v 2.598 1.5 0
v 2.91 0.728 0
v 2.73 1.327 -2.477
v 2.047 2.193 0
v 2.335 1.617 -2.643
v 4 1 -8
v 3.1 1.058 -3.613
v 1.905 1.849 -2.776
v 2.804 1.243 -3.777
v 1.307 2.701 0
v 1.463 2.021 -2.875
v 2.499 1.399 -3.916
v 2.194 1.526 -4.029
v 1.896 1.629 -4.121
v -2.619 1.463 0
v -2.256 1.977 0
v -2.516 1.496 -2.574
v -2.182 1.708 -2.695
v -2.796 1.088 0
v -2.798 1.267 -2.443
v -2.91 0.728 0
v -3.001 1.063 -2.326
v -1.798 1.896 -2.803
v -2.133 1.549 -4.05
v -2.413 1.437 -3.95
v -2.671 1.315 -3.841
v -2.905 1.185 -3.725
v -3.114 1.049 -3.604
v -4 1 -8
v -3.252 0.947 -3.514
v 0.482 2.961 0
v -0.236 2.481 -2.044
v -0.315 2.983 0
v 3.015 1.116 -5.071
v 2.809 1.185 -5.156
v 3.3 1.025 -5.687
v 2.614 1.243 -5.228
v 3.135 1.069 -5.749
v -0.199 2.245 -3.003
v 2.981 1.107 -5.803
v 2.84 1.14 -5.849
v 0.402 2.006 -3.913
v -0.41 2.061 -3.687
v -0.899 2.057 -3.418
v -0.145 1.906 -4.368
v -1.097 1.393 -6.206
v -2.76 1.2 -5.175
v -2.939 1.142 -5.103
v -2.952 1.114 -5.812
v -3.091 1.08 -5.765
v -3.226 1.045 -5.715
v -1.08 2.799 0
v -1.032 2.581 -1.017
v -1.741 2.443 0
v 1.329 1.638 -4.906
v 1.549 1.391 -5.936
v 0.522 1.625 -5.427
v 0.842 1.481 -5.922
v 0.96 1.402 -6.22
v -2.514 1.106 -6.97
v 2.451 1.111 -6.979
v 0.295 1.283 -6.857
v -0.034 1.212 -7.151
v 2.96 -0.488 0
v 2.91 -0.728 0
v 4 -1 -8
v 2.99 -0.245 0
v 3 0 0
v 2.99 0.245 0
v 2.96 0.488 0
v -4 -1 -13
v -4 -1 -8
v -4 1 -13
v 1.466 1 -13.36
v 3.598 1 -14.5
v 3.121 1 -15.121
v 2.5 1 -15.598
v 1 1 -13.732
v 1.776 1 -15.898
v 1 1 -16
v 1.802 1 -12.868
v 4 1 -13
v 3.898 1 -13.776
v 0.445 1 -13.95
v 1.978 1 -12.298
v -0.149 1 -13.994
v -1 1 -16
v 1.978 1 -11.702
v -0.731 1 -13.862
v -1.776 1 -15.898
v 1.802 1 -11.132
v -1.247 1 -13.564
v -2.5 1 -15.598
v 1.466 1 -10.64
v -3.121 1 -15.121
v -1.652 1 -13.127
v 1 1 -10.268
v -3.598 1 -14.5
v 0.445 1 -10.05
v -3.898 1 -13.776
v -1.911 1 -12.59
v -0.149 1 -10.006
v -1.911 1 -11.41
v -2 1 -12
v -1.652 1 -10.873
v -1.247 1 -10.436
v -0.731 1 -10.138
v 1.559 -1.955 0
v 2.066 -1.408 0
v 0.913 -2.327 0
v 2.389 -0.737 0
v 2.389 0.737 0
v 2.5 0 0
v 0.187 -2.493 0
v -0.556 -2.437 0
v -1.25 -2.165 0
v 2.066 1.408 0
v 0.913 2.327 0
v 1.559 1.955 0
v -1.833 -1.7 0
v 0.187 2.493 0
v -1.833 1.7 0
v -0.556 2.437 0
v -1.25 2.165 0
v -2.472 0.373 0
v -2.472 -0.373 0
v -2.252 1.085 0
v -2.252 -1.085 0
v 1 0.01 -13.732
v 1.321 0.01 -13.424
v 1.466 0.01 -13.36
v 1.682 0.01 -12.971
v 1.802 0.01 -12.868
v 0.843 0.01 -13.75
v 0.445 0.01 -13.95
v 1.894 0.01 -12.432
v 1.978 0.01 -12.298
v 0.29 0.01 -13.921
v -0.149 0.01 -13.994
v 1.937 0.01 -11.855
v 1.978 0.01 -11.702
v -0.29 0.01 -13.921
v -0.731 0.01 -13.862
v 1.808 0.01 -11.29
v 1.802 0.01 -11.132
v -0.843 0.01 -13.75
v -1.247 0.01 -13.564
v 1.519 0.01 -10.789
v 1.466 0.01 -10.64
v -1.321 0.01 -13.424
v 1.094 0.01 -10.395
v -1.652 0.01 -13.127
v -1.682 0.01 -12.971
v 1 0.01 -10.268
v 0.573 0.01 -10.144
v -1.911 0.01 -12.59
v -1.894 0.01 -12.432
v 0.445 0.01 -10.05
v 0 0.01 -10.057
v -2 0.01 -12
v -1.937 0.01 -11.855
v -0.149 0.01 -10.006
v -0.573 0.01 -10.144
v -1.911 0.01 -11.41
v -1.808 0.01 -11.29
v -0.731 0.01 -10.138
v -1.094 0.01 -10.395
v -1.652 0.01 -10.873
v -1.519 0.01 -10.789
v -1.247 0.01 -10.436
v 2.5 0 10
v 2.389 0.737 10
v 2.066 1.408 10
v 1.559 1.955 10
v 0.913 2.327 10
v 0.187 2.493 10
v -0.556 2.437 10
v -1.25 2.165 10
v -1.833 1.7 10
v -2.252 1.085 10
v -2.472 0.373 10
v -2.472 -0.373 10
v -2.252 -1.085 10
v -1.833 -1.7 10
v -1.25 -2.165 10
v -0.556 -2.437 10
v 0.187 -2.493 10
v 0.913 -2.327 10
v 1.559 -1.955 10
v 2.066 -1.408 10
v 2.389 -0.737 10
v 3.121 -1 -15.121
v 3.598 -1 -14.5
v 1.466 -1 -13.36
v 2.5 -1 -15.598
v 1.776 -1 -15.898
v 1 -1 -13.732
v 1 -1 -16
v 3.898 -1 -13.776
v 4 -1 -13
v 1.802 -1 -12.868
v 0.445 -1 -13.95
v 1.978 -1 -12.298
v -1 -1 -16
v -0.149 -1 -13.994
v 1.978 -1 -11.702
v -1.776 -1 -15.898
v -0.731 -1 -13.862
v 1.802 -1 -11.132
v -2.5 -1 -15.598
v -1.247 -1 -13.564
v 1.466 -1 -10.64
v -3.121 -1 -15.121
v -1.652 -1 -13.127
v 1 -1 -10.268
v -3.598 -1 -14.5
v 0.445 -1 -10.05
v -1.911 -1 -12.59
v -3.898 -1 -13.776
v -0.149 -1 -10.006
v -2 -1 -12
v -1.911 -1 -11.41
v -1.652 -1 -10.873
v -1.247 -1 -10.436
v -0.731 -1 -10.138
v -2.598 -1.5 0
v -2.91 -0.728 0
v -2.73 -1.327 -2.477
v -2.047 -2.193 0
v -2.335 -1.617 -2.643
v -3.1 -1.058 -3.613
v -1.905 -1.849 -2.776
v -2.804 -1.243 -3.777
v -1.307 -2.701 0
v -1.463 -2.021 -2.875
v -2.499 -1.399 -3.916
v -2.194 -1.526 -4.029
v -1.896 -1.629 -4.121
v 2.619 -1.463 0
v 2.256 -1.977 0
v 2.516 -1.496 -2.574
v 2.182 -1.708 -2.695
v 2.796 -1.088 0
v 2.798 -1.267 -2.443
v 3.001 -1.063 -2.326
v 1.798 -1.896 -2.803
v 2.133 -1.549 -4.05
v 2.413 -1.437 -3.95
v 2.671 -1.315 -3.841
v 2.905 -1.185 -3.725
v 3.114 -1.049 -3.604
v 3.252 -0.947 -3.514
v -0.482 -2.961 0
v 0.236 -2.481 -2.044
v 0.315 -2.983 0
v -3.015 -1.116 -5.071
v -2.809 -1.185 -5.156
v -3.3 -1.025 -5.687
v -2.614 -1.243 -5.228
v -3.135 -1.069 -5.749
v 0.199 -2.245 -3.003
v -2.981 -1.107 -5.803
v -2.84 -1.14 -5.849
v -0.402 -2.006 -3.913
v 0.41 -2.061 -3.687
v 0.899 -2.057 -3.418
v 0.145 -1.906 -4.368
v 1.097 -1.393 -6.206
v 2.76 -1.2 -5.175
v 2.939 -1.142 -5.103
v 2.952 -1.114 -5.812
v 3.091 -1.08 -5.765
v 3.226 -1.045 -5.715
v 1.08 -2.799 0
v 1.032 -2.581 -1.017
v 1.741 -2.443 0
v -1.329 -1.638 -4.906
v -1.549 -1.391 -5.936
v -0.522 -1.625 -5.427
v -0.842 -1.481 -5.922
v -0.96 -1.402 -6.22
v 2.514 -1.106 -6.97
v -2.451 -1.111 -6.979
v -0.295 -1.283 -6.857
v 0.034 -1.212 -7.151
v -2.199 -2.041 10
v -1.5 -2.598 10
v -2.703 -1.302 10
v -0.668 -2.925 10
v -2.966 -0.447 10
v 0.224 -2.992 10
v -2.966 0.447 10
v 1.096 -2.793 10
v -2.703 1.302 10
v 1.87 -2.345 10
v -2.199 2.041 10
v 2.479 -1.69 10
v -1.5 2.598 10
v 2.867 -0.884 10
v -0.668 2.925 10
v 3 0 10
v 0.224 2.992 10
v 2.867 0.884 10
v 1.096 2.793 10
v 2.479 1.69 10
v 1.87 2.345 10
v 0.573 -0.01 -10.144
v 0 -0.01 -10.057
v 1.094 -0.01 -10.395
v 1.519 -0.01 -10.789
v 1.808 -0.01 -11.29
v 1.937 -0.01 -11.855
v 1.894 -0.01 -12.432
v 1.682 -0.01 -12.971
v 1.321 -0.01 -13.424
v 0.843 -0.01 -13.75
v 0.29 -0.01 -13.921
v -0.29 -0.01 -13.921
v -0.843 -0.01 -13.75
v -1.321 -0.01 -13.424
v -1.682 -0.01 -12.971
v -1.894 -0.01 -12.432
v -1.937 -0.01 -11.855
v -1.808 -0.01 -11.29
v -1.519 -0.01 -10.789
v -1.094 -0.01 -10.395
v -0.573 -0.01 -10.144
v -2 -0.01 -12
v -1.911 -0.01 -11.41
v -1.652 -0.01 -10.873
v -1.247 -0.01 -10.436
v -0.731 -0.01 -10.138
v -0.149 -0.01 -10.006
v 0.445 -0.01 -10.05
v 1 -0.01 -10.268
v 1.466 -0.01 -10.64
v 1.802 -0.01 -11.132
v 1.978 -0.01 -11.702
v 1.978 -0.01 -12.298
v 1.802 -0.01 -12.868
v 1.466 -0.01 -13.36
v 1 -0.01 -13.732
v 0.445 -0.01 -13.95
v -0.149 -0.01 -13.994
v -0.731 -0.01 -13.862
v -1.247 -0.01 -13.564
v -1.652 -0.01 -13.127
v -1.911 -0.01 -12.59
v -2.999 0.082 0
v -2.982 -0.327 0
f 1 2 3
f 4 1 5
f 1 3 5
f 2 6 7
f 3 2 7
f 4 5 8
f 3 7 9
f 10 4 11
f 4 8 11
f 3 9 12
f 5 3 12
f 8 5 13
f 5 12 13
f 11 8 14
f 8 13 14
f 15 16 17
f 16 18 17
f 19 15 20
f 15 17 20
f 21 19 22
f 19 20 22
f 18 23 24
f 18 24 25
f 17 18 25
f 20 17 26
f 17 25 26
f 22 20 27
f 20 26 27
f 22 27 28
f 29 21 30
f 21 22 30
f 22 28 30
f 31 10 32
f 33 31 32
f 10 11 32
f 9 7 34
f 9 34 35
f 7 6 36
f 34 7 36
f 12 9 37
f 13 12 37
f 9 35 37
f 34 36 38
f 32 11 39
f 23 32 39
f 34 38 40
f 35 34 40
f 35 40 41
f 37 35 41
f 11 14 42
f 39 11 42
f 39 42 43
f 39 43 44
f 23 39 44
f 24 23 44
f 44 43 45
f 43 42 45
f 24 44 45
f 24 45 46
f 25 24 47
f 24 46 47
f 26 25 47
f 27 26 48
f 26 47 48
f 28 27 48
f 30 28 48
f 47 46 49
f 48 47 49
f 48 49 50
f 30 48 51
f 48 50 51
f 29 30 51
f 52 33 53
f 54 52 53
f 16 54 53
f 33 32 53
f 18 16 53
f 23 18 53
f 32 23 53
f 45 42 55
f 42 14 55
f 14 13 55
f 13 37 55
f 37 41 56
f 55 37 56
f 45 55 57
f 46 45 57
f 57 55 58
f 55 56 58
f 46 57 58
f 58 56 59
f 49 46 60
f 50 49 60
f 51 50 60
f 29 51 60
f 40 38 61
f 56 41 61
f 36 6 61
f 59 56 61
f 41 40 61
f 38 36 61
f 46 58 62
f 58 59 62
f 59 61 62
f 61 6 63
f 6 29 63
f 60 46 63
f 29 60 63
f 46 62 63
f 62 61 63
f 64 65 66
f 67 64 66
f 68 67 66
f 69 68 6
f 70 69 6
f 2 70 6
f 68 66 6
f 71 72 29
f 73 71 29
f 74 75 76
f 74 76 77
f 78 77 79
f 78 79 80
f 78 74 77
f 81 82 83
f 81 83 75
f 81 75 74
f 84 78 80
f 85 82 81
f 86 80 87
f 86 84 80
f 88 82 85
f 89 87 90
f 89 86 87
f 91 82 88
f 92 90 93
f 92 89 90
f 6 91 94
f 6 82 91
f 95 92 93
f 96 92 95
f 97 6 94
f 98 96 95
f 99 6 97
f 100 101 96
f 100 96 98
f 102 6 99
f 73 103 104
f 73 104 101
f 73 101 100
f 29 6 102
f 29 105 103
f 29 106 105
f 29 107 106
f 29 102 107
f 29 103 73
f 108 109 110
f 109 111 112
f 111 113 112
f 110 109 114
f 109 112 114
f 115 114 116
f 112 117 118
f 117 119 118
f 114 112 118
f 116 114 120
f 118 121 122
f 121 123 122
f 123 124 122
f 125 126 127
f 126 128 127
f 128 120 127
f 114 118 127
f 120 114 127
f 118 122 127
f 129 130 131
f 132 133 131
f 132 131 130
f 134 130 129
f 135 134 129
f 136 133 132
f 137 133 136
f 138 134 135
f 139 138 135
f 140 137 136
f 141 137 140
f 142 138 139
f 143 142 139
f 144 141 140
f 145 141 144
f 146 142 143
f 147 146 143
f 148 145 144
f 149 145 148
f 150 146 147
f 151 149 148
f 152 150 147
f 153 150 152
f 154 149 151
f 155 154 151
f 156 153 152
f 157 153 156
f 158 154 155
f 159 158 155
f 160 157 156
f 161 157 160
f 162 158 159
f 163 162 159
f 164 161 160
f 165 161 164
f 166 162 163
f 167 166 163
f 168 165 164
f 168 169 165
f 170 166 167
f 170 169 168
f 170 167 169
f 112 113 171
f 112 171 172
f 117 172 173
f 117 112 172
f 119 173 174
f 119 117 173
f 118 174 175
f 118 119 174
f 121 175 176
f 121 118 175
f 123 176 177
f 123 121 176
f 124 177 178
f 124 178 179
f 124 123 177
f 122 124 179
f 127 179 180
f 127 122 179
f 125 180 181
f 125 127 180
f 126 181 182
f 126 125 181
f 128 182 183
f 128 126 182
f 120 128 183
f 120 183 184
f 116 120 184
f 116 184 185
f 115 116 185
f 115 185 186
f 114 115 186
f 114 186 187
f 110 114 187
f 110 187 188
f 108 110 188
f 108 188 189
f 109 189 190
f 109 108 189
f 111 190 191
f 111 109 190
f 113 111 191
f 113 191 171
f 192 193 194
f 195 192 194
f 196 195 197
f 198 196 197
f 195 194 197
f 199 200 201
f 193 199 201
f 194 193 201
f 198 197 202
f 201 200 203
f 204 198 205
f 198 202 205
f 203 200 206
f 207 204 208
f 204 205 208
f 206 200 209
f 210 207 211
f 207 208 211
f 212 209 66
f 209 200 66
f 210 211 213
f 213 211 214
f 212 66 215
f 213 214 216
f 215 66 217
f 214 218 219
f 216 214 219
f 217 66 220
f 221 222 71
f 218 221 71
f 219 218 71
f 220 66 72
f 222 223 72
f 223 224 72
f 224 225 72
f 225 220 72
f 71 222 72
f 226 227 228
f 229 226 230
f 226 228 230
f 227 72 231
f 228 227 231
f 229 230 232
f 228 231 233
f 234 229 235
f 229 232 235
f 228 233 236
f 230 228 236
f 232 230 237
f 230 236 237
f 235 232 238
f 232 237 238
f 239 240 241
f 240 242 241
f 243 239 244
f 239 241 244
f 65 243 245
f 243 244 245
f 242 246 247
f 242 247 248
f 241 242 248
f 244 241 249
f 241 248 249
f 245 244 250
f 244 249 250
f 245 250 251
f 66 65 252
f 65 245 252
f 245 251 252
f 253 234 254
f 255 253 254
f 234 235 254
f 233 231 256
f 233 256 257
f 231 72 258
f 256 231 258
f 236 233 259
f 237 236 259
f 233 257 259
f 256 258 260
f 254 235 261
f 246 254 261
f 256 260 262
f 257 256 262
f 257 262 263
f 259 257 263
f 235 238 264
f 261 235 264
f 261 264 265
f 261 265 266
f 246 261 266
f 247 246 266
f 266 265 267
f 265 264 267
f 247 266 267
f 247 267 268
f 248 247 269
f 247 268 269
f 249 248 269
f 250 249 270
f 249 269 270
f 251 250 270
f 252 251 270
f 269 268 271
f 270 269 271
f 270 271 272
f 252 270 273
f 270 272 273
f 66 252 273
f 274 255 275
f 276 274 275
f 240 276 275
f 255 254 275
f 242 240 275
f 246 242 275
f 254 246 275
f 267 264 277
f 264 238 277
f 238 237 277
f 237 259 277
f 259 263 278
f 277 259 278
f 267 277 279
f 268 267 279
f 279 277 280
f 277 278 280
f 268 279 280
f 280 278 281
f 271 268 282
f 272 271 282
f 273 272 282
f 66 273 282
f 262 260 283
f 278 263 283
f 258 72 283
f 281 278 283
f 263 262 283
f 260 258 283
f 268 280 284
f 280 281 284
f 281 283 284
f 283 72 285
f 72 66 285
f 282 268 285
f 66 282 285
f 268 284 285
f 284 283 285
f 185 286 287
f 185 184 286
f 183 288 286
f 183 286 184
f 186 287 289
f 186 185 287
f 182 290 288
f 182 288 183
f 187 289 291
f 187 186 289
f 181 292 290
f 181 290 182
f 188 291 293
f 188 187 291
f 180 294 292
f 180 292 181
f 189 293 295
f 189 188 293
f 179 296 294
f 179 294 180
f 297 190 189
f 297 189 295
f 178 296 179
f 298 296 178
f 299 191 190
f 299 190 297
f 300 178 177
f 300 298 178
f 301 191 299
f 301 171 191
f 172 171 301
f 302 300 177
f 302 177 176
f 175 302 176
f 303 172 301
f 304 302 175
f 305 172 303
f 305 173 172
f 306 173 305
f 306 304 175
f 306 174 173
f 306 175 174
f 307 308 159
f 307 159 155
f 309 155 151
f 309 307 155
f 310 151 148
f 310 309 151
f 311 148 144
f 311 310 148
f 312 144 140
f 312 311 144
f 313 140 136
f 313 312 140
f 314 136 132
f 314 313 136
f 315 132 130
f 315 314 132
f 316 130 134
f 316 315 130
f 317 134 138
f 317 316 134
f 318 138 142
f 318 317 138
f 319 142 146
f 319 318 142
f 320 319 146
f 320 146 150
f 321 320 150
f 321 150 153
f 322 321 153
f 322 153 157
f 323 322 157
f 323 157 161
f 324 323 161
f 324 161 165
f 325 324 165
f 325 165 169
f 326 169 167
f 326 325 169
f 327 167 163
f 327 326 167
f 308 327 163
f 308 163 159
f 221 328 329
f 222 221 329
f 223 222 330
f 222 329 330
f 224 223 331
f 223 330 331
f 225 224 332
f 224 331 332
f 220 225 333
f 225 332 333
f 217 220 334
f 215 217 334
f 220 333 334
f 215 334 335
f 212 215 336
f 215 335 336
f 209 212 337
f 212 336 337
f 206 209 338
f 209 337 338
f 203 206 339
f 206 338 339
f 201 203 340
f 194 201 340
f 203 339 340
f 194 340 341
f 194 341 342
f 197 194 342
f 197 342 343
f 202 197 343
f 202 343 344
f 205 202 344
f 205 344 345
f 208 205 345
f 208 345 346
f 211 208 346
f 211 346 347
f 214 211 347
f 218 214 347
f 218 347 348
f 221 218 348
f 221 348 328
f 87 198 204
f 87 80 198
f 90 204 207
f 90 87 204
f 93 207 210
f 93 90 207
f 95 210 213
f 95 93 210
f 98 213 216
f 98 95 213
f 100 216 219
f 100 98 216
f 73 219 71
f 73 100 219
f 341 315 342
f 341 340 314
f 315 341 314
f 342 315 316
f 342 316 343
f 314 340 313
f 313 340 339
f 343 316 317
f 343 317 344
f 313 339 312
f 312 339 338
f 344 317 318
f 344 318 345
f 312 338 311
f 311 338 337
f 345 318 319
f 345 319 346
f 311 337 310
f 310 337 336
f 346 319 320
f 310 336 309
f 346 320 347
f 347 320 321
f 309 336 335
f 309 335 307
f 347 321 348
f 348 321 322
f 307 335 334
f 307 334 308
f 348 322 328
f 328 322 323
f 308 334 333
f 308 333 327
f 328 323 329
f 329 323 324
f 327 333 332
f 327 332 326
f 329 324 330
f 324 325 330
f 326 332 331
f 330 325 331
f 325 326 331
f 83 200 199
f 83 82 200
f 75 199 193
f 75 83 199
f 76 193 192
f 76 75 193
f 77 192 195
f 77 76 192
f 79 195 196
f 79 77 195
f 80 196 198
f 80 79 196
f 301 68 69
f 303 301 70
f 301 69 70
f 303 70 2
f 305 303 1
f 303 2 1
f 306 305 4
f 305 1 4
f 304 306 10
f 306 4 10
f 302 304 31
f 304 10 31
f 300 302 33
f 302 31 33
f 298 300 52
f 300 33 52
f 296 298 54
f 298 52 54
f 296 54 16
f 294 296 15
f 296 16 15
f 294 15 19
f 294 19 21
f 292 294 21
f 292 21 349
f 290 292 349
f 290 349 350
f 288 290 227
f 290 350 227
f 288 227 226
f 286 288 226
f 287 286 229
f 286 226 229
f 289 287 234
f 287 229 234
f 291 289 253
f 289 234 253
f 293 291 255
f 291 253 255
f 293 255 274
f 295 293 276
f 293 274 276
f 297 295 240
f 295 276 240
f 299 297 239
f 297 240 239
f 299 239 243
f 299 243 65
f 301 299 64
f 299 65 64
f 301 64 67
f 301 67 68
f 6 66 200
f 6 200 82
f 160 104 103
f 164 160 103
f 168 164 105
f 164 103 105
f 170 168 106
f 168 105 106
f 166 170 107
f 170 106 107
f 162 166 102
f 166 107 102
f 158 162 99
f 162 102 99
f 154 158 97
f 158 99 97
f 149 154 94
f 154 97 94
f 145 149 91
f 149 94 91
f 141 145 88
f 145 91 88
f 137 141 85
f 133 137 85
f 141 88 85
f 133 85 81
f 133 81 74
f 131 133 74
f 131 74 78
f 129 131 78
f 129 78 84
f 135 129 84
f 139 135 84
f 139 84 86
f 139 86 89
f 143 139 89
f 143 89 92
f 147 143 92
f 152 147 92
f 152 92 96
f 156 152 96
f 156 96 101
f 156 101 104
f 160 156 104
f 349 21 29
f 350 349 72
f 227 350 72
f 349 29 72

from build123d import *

# Parameters (mm, degrees)
ESQUISSE1_R             = 3
ESQUISSE1_R_2           = 2.5
BOSS_EXTRU_1_DEPTH      = 10
ESQUISSE4_W             = 8
ESQUISSE4_H             = 2
BOSS_EXTRU_2_DEPTH      = 8
CONG_1_R                = 3
ESQUISSE6_R             = 2
ENL_V_MAT_EXTRU_2_DEPTH = 12
BOSS_EXTRU_3_DEPTH      = 0.01
BOSS_EXTRU_3_DEPTH_BACK = 0.01
ESQUISSE7_R             = 2
ESQUISSE7_R_2           = 1.94261234


with BuildPart() as part:
    # Esquisse1 → Boss.-Extru.1 (new body)
    with BuildSketch(Plane.XY):
        Circle(ESQUISSE1_R)
        Circle(ESQUISSE1_R_2, mode=Mode.SUBTRACT)
    extrude(amount=BOSS_EXTRU_1_DEPTH)

    # Esquisse3 for Lissage3 → Lissage3 section 0
    with BuildSketch(Plane(origin=(0, 0, 0), x_dir=(-1, 0, 0), z_dir=(0, 0, -1))):
        with BuildLine():
            # circular arc as an exact rational Bezier (weights 1, cos(half-angle), 1)
            Bezier((-2.9104275, 0.727606875), (0, 12.369316884), (2.9104275, 0.727606875), weights=[1, 0.242535625, 1])
            Bezier((2.9104275, 0.727606875), (3.09232922, 0), (2.9104275, -0.727606875), weights=[1, 0.9701425, 1])
            Bezier((2.9104275, -0.727606875), (0, -12.369316884), (-2.9104275, -0.727606875), weights=[1, 0.242535625, 1])
            Bezier((-2.9104275, -0.727606875), (-3.09232922, 0), (-2.9104275, 0.727606875), weights=[1, 0.9701425, 1])
        make_face()
    # Esquisse2 → Lissage3 section 1
    with BuildSketch(Plane.XY.offset(-8)):
        with BuildLine():
            Line((4, 1), (-4, 1))
            Line((-4, 1), (-4, -1))
            Line((-4, -1), (4, -1))
            Line((4, -1), (4, 1))
        make_face()
    loft()

    # Esquisse4 → Boss.-Extru.2 (add)
    with BuildSketch(Plane(origin=(0, 0, -8), x_dir=(-1, 0, 0), z_dir=(0, 0, -1))):
        Rectangle(ESQUISSE4_W, ESQUISSE4_H)
    extrude(amount=BOSS_EXTRU_2_DEPTH)

    # Congé1
    cong_1_edges = [part.edges().sort_by_distance(p)[0] for p in [
        (-4, 0, -16),
        (4, 0, -16),
    ]]
    fillet(cong_1_edges, radius=CONG_1_R)

    # Esquisse6 → Enlèv. mat.-Extru.2 (cut)
    with BuildSketch(Plane(origin=(0, 1, 0), x_dir=(1, 0, 0), z_dir=(0, 1, 0))):
        with Locations(Location((0, 12, 0), (0, 0, 180))):
            Circle(ESQUISSE6_R)
    extrude(amount=-ENL_V_MAT_EXTRU_2_DEPTH, mode=Mode.SUBTRACT)

    # Esquisse7 → Boss.-Extru.3 (add, two sides: drawn at the far end of the back side and taken through both)
    with BuildSketch(Plane(origin=(0, 0, 0), x_dir=(1, 0, 0), z_dir=(0, 1, 0)).offset(-BOSS_EXTRU_3_DEPTH_BACK)):
        with Locations(Location((0, 12, 0), (0, 0, 180))):
            Circle(ESQUISSE7_R)
        with Locations(Location((0, 12, 0), (0, 0, 270))):
            Circle(ESQUISSE7_R_2, mode=Mode.SUBTRACT)
    extrude(amount=BOSS_EXTRU_3_DEPTH + BOSS_EXTRU_3_DEPTH_BACK)


solid = part.part
